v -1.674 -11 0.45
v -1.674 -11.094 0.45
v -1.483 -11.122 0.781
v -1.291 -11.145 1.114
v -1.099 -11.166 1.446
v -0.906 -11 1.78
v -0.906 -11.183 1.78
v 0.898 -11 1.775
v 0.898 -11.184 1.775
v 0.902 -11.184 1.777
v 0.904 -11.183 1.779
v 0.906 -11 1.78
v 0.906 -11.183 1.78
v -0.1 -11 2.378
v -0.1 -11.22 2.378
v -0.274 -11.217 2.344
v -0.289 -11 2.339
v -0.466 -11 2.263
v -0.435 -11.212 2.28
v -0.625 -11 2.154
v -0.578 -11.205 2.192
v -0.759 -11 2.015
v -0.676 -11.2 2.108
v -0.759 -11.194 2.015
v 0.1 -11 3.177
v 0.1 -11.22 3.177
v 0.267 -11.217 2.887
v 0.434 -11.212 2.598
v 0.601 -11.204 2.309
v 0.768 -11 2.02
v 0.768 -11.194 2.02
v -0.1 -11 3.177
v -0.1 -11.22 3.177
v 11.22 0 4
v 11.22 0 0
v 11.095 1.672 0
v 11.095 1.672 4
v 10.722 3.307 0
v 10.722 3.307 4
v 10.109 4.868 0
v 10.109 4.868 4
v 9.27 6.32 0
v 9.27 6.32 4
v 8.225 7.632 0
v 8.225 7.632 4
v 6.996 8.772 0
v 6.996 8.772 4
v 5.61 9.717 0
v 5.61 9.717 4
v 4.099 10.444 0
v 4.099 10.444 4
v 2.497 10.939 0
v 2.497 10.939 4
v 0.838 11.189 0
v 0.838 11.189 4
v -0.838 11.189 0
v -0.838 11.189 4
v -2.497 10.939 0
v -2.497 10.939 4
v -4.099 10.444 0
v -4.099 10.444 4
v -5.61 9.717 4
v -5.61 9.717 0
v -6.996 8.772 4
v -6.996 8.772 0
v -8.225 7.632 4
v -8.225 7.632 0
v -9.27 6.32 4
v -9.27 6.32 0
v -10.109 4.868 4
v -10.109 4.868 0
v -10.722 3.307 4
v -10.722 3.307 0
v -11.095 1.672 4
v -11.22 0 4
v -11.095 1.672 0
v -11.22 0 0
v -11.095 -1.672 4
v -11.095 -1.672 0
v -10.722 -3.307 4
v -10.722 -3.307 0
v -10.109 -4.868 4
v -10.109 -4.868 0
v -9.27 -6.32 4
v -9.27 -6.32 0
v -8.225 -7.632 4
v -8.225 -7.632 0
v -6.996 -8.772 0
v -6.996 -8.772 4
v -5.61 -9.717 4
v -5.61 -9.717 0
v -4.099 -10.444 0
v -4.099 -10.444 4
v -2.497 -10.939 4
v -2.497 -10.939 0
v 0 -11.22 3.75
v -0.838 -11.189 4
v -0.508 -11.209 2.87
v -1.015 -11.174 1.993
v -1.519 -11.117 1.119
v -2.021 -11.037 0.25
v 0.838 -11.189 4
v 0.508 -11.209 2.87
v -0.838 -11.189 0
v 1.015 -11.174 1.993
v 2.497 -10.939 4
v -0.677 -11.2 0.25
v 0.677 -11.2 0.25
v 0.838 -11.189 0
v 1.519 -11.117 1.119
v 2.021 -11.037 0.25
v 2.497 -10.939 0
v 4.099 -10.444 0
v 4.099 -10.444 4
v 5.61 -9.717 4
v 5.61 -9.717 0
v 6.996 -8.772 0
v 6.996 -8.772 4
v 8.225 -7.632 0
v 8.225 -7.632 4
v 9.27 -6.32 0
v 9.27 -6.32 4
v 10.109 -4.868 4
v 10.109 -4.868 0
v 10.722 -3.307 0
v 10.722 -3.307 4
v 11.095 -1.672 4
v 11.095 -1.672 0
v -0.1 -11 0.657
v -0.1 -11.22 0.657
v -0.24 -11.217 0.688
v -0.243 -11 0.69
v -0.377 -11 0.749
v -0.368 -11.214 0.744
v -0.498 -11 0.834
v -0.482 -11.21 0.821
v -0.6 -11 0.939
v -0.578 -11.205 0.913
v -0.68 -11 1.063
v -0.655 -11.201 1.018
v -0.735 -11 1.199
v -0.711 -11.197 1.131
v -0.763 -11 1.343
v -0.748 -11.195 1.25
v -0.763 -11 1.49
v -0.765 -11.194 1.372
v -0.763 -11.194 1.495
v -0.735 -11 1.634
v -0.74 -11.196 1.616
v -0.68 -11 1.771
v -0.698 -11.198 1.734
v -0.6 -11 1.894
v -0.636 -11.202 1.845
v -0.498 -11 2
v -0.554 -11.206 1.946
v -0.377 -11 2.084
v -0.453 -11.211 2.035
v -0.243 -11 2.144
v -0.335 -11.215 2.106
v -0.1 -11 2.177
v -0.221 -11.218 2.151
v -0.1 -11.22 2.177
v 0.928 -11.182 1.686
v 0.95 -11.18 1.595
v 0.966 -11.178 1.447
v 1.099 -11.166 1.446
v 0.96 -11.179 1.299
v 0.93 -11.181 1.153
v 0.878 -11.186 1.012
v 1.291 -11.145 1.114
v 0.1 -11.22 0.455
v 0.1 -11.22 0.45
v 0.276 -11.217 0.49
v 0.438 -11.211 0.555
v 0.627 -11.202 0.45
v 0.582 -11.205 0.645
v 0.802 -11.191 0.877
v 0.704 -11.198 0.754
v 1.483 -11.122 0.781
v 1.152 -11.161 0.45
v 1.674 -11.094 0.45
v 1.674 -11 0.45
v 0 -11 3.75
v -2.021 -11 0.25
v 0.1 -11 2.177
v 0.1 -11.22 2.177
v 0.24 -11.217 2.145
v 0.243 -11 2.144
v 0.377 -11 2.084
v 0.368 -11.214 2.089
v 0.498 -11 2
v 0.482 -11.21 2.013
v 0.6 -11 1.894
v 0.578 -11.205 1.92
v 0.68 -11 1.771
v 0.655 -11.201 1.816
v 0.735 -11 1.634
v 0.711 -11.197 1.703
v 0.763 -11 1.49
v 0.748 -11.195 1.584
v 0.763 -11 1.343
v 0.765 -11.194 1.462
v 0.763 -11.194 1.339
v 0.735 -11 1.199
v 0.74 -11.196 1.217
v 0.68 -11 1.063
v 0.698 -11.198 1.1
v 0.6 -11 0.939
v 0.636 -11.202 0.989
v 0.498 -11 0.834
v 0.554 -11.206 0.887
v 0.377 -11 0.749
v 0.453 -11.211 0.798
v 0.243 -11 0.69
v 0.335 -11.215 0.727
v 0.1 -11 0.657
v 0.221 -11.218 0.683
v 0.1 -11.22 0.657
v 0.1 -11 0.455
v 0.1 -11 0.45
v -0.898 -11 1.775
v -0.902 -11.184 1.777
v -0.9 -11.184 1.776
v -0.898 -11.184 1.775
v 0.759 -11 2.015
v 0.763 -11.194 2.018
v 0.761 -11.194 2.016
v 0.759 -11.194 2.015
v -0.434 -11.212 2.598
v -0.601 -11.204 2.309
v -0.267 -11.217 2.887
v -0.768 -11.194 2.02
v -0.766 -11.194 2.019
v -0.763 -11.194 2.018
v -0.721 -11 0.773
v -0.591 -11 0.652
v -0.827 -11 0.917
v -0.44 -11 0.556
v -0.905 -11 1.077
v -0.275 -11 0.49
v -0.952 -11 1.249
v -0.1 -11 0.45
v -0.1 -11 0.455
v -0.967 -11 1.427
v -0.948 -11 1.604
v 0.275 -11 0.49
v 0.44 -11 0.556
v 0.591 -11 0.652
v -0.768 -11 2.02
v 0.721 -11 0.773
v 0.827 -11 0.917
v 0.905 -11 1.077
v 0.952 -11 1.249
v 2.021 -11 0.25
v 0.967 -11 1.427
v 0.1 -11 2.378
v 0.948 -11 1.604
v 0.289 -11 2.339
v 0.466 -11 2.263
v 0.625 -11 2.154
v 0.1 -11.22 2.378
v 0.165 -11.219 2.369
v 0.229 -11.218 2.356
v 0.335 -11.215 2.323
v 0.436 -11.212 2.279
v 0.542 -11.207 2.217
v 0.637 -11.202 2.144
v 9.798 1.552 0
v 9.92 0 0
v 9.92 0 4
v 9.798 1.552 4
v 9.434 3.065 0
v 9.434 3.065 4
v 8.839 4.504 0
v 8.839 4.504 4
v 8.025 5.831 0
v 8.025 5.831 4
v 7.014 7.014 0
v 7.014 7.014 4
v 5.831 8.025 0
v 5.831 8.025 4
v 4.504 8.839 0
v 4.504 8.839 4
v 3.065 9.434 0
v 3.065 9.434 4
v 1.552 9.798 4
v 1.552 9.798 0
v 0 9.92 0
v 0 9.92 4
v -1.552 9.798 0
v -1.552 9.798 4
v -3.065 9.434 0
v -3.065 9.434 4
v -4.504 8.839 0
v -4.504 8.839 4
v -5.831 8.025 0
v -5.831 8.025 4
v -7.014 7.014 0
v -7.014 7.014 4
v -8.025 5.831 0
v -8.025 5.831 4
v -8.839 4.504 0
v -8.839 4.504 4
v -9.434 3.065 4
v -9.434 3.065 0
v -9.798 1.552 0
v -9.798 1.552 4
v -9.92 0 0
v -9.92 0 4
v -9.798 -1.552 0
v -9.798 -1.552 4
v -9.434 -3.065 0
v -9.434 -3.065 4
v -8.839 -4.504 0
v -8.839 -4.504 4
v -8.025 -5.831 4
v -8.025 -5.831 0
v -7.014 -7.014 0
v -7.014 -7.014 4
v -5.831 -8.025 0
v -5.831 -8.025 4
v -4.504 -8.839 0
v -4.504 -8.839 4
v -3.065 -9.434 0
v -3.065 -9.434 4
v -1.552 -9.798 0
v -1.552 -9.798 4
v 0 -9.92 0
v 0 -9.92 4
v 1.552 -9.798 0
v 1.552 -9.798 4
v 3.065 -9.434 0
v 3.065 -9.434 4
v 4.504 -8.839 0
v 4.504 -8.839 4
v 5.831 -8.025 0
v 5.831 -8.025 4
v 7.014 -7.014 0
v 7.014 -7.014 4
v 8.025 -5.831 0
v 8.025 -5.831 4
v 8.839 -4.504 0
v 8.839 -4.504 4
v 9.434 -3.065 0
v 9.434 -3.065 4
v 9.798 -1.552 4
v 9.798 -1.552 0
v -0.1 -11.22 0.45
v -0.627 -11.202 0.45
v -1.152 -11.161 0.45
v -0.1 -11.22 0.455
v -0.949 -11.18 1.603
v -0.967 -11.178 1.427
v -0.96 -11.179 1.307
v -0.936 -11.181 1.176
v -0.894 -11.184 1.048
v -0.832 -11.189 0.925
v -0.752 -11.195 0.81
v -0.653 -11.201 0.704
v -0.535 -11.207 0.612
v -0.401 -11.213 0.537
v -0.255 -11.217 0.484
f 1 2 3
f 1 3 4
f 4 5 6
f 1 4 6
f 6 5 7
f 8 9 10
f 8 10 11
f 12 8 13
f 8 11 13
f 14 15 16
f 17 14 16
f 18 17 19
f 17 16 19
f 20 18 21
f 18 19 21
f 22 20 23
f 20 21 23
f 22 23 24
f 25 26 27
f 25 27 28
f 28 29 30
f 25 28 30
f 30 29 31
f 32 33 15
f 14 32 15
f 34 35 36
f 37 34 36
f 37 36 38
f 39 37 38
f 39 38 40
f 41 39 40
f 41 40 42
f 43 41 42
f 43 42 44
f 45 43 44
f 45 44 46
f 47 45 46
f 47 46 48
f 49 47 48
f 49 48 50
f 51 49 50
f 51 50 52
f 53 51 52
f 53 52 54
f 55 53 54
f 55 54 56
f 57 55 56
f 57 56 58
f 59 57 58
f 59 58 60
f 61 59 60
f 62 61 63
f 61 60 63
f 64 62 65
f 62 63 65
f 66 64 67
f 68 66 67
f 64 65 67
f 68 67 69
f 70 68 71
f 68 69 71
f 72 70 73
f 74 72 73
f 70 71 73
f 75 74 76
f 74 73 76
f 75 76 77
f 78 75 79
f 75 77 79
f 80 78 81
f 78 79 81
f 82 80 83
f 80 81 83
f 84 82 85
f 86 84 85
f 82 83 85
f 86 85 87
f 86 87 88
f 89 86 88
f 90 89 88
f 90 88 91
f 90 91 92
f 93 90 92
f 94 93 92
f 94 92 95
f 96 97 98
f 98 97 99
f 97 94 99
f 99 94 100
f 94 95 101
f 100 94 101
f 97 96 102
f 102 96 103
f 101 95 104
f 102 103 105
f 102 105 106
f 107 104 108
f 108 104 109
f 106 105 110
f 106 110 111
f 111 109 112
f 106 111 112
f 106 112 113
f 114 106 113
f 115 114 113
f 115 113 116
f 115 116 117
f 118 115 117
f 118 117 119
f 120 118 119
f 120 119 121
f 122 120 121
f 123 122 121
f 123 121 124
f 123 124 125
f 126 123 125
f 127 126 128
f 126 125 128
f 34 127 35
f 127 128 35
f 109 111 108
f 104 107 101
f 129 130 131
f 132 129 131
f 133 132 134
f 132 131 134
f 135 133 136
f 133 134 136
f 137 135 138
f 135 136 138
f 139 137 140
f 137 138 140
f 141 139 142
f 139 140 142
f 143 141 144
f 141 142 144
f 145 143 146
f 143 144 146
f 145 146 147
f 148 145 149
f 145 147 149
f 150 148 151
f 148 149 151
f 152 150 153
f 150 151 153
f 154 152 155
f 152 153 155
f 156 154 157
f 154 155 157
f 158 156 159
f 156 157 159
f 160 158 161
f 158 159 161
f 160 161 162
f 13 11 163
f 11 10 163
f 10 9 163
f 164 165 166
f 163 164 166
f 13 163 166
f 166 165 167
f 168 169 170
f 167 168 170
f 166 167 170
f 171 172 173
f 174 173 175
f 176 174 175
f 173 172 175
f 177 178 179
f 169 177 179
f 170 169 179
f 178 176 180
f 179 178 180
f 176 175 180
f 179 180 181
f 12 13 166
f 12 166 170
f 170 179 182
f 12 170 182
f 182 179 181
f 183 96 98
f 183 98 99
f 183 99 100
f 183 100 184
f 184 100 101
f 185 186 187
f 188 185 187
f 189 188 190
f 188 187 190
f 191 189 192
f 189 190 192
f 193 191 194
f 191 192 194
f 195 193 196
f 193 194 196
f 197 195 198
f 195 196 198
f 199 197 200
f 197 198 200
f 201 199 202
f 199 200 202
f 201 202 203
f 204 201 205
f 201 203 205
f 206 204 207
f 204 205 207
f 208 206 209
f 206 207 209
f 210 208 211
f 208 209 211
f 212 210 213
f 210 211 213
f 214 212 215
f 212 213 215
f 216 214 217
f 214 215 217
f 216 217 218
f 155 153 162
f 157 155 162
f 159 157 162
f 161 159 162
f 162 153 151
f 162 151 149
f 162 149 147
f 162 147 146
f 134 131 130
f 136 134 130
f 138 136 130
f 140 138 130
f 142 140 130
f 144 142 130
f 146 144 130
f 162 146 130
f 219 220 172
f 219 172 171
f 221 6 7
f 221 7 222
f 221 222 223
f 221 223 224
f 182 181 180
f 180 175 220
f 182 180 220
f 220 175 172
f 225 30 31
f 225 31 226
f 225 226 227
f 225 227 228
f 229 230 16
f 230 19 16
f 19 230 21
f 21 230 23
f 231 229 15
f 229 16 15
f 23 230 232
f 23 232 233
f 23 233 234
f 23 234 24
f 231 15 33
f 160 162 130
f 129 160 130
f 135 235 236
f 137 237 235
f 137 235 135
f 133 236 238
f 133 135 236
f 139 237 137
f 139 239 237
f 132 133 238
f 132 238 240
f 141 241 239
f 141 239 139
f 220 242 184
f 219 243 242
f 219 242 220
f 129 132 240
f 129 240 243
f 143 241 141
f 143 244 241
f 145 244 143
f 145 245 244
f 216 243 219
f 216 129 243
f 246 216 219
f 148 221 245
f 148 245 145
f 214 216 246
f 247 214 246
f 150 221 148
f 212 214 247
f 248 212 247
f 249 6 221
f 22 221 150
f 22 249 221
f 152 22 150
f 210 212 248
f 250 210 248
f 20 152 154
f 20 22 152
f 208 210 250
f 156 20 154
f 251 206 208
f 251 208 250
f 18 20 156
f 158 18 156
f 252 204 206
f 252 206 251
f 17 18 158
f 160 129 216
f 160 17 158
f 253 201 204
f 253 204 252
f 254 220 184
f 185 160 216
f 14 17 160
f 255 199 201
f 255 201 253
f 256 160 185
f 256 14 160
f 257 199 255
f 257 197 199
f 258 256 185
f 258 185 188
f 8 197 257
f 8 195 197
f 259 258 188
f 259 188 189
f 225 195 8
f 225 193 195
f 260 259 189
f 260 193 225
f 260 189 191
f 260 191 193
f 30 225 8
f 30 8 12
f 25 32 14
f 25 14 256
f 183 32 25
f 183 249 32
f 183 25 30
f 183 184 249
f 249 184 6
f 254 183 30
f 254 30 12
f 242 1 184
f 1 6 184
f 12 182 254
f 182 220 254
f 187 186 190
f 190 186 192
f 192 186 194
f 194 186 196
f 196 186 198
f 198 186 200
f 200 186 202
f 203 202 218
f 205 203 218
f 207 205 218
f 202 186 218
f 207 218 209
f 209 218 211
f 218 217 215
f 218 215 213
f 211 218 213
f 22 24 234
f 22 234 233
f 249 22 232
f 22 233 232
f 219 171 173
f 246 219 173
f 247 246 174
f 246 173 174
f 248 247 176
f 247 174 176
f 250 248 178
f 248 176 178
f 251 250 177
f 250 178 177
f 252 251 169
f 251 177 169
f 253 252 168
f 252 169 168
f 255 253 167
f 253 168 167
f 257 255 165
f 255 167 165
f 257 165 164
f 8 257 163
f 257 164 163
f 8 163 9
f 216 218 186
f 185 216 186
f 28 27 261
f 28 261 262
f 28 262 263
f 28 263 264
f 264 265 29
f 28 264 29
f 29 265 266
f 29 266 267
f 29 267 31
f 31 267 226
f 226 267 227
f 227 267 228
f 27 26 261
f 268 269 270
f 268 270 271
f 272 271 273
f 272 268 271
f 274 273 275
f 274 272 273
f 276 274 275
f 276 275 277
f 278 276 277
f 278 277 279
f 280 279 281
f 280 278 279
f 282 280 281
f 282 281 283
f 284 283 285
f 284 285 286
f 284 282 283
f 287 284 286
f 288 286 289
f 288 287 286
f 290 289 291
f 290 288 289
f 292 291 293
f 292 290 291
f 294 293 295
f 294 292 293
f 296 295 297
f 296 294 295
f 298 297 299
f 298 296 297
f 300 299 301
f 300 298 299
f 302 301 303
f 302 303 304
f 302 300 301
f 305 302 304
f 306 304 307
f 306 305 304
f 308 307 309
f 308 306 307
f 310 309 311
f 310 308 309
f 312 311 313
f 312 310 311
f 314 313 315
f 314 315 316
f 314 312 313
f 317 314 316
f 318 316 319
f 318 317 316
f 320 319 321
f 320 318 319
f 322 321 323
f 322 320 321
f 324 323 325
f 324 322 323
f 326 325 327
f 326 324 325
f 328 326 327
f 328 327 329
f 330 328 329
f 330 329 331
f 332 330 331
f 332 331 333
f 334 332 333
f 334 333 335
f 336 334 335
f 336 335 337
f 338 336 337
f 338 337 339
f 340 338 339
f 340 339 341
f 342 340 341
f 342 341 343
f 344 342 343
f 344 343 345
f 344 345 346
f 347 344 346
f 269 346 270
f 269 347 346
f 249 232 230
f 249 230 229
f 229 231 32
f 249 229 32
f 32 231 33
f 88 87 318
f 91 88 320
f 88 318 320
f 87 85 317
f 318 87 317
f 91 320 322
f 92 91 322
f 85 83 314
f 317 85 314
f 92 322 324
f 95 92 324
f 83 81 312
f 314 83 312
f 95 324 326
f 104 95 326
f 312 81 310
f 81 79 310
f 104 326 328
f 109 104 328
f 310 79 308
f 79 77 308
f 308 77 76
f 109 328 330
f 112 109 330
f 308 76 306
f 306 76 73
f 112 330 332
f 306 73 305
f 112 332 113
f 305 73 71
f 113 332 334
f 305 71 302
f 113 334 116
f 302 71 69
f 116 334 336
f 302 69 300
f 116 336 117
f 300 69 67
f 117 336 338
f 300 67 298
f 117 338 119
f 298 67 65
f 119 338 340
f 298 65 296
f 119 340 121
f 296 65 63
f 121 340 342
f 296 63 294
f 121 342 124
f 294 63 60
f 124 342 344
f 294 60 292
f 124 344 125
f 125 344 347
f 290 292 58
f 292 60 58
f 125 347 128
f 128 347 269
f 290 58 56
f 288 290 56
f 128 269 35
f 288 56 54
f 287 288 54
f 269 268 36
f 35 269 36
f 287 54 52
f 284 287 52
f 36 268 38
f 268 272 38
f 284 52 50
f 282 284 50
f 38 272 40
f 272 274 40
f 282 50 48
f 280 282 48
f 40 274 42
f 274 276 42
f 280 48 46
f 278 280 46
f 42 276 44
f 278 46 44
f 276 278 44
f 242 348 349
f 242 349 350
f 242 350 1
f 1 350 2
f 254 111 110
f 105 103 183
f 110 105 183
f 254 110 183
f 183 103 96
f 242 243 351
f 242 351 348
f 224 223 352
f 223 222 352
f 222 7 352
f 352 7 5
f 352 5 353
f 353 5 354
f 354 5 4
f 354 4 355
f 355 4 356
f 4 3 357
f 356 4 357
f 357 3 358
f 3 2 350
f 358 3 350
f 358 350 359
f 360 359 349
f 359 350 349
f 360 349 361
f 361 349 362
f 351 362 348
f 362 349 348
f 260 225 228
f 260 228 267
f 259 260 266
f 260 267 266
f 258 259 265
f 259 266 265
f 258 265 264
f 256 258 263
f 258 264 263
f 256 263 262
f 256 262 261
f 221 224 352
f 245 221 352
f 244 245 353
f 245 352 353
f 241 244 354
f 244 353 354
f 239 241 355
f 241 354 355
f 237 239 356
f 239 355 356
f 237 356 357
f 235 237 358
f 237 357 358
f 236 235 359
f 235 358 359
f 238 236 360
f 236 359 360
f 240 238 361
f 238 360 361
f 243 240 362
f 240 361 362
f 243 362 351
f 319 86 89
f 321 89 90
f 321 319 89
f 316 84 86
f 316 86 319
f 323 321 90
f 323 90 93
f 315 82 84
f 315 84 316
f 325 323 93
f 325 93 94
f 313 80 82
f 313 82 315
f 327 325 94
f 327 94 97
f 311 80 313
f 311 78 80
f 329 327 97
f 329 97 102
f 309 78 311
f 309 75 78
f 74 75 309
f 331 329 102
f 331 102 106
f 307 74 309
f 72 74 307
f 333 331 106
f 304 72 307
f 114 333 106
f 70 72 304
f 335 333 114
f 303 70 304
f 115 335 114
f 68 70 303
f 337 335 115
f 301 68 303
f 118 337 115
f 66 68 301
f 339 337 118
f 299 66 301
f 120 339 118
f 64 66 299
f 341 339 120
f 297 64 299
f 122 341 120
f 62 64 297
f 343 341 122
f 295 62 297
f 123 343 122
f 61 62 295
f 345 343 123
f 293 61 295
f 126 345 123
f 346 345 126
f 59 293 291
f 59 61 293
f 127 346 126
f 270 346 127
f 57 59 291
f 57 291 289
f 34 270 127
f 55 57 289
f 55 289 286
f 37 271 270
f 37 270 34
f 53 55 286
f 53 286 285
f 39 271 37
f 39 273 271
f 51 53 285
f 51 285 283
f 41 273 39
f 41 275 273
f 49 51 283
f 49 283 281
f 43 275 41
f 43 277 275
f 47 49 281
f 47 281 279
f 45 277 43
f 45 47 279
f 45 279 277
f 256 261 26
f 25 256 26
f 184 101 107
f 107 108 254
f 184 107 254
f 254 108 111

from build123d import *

# Parameters (mm, degrees)
F0_R     = 11.22
F0_R_2   = 9.92
F1_DEPTH = 4
F4_DEPTH = 0.3


with BuildPart() as f1:
    # F0 (on Top) → F1 (new body)
    with BuildSketch(Plane.XY):
        Circle(F0_R)
        Circle(F0_R_2, mode=Mode.SUBTRACT)
    extrude(amount=F1_DEPTH)

    # F3 (on offset) → F4 (cut)
    with BuildSketch(Plane.XZ.offset(11.3)):
        Polygon((0, 3.75), (-2.020726, 0.25), (2.020726, 0.25), align=None)
        with BuildLine():
            Line((-0.1, 0.45), (-1.674316, 0.45))
            Line((-1.674316, 0.45), (-0.9065, 1.779896))
            Line((-0.9065, 1.779896), (-0.89784, 1.774896))
            ThreePointArc((-0.89784, 1.774896), (-0.827242, 0.916552), (-0.1, 0.455186))
            Line((-0.1, 0.455186), (-0.1, 0.45))
        make_face(mode=Mode.SUBTRACT)
        with BuildLine():
            ThreePointArc((-0.1, 0.65655), (-0.766667, 1.416667), (-0.1, 2.176784))
            Line((-0.1, 2.176784), (-0.1, 0.65655))
        make_face(mode=Mode.SUBTRACT)
        with BuildLine():
            Line((0.9065, 1.779896), (1.674316, 0.45))
            Line((1.674316, 0.45), (0.1, 0.45))
            Line((0.1, 0.45), (0.1, 0.455186))
            ThreePointArc((0.1, 0.455186), (0.827242, 0.916552), (0.89784, 1.774896))
            Line((0.89784, 1.774896), (0.9065, 1.779896))
        make_face(mode=Mode.SUBTRACT)
        with BuildLine():
            ThreePointArc((0.1, 2.176784), (0.766667, 1.416667), (0.1, 0.65655))
            Line((0.1, 0.65655), (0.1, 2.176784))
        make_face(mode=Mode.SUBTRACT)
        with BuildLine():
            Line((-0.767816, 2.020104), (-0.1, 3.176795))
            Line((-0.1, 3.176795), (-0.1, 2.378147))
            ThreePointArc((-0.1, 2.378147), (-0.466355, 2.2634), (-0.759155, 2.015104))
            Line((-0.759155, 2.015104), (-0.767816, 2.020104))
        make_face(mode=Mode.SUBTRACT)
        with BuildLine():
            Line((0.1, 2.378147), (0.1, 3.176795))
            Line((0.1, 3.176795), (0.767816, 2.020104))
            Line((0.767816, 2.020104), (0.759155, 2.015104))
            ThreePointArc((0.759155, 2.015104), (0.466355, 2.2634), (0.1, 2.378147))
        make_face(mode=Mode.SUBTRACT)
    extrude(amount=-F4_DEPTH, mode=Mode.SUBTRACT)


solid = f1.part
